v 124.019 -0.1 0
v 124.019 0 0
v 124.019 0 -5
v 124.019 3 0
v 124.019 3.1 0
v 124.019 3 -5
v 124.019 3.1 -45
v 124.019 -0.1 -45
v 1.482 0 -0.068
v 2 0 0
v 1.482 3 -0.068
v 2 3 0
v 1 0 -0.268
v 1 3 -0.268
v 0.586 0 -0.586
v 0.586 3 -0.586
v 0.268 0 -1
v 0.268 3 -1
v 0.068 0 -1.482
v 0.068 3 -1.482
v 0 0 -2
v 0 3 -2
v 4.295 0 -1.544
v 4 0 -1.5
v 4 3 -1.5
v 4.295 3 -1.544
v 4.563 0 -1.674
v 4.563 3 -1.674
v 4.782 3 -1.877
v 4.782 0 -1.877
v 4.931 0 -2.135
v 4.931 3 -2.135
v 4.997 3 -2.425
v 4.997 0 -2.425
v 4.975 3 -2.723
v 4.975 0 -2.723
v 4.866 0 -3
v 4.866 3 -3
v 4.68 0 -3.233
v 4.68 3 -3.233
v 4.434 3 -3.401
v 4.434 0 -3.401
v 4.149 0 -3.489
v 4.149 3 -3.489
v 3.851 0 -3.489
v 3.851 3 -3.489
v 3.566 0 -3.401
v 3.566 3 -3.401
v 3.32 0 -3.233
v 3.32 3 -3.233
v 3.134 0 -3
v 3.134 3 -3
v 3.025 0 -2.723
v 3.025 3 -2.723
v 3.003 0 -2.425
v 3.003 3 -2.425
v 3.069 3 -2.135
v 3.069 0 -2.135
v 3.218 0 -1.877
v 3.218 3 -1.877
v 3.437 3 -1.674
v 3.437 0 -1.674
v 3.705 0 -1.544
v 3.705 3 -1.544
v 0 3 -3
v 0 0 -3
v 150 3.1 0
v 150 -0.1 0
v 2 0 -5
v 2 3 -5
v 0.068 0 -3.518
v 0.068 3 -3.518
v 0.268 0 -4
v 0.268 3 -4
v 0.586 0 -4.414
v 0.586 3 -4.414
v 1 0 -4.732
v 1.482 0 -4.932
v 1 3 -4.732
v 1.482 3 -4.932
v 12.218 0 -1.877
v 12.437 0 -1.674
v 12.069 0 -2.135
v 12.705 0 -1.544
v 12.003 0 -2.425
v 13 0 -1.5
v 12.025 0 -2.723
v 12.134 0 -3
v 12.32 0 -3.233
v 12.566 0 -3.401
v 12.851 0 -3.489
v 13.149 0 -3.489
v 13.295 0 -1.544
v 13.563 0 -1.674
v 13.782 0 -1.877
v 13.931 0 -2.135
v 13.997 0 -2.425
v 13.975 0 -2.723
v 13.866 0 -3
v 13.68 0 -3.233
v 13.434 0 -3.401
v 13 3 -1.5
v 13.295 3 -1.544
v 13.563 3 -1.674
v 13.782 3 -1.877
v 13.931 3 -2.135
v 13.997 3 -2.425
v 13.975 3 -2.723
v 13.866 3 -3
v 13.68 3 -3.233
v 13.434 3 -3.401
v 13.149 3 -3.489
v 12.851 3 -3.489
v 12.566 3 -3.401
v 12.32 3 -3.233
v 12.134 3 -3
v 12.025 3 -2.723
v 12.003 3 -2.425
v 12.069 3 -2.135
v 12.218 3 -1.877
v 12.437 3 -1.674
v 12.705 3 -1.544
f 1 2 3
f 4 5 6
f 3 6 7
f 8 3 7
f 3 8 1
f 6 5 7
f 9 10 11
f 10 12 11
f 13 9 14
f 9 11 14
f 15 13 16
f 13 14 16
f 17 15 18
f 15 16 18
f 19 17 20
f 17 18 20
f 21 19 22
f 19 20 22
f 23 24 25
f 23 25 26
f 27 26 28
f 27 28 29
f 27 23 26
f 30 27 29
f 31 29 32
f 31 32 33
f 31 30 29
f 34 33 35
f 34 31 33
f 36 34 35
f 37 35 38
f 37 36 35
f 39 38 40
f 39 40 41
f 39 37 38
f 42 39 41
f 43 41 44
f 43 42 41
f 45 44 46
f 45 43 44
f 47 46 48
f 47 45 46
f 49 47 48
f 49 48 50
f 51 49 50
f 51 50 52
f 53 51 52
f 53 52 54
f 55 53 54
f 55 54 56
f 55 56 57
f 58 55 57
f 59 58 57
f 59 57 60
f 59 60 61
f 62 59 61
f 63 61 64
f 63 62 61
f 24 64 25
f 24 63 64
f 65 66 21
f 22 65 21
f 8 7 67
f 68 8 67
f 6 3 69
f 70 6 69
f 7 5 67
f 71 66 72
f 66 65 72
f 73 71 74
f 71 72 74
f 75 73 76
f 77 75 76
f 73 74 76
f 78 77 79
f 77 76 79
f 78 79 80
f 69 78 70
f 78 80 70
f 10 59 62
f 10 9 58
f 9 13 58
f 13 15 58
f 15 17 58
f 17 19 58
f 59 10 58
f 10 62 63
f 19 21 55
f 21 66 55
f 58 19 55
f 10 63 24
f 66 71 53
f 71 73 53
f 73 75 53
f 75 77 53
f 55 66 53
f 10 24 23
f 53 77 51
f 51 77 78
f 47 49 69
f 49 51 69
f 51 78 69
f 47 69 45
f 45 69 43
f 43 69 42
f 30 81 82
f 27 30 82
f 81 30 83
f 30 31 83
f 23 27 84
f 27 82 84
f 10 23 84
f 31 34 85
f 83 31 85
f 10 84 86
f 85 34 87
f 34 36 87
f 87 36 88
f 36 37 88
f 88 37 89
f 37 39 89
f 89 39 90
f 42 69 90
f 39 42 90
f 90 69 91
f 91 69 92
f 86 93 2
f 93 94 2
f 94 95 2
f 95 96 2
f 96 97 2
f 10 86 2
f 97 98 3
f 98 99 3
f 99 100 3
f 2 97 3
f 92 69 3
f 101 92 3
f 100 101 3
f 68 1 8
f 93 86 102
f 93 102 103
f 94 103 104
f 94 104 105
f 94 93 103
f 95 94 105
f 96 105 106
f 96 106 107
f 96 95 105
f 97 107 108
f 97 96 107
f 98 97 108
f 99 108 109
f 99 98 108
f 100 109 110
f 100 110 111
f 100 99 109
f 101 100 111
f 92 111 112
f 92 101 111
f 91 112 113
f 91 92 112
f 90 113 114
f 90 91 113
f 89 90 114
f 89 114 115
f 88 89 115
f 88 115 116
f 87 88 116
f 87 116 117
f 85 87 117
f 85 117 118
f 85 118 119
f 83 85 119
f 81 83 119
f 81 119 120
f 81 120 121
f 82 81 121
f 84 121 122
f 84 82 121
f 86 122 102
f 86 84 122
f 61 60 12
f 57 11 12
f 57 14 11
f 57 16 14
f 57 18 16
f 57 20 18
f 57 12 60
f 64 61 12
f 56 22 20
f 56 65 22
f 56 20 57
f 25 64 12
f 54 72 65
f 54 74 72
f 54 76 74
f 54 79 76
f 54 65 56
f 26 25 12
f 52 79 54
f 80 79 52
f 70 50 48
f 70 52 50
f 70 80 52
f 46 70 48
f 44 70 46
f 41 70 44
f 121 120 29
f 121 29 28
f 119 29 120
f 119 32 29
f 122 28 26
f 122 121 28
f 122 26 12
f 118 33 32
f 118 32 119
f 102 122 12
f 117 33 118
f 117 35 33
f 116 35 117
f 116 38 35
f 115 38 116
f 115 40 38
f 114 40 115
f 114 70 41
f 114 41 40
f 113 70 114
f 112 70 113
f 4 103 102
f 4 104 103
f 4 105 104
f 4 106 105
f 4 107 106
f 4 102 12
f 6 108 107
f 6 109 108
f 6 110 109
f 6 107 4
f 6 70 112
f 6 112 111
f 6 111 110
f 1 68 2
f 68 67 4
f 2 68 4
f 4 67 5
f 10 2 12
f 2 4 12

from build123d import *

# Parameters (mm, degrees)
SKETCH1_R           = 1
BOSS_EXTRUDE1_DEPTH = 3
FILLET1_R           = 2
BOSS_EXTRUDE2_DEPTH = 0.1
BOSS_EXTRUDE3_DEPTH = 0.1


with BuildPart() as part:
    # Sketch1 → Boss-Extrude1 (new body)
    with BuildSketch(Plane(origin=(0, 0, 0), x_dir=(1, 0, 0), z_dir=(0, 1, 0))):
        Polygon((0, 0), (150, 0), (124.019237886, 45), (124.019237886, 5), (0, 5), align=None)
        with Locations(Location((4, 2.5, 0), (0, 0, 270))):
            Circle(SKETCH1_R, mode=Mode.SUBTRACT)
        with Locations(Location((13, 2.5, 0), (0, 0, 270))):
            Circle(SKETCH1_R, mode=Mode.SUBTRACT)
    extrude(amount=BOSS_EXTRUDE1_DEPTH)

    # Fillet1
    fillet1_edges = [part.edges().sort_by_distance(p)[0] for p in [
        (0, 1.5, -5),
        (0, 1.5, 0),
    ]]
    fillet(fillet1_edges, radius=FILLET1_R)

    # Sketch2 → Boss-Extrude2 (add)
    with BuildSketch(Plane(origin=(0, 3, 0), x_dir=(1, 0, 0), z_dir=(0, 1, 0))):
        Polygon((150, 0), (124.019237886, 45), (124.019237886, 0), align=None)
    extrude(amount=BOSS_EXTRUDE2_DEPTH)

    # Sketch3 → Boss-Extrude3 (add)
    with BuildSketch(Plane.XZ):
        Polygon((124.019237886, -45), (150, 0), (124.019237886, 0), align=None)
    extrude(amount=BOSS_EXTRUDE3_DEPTH)


solid = part.part
